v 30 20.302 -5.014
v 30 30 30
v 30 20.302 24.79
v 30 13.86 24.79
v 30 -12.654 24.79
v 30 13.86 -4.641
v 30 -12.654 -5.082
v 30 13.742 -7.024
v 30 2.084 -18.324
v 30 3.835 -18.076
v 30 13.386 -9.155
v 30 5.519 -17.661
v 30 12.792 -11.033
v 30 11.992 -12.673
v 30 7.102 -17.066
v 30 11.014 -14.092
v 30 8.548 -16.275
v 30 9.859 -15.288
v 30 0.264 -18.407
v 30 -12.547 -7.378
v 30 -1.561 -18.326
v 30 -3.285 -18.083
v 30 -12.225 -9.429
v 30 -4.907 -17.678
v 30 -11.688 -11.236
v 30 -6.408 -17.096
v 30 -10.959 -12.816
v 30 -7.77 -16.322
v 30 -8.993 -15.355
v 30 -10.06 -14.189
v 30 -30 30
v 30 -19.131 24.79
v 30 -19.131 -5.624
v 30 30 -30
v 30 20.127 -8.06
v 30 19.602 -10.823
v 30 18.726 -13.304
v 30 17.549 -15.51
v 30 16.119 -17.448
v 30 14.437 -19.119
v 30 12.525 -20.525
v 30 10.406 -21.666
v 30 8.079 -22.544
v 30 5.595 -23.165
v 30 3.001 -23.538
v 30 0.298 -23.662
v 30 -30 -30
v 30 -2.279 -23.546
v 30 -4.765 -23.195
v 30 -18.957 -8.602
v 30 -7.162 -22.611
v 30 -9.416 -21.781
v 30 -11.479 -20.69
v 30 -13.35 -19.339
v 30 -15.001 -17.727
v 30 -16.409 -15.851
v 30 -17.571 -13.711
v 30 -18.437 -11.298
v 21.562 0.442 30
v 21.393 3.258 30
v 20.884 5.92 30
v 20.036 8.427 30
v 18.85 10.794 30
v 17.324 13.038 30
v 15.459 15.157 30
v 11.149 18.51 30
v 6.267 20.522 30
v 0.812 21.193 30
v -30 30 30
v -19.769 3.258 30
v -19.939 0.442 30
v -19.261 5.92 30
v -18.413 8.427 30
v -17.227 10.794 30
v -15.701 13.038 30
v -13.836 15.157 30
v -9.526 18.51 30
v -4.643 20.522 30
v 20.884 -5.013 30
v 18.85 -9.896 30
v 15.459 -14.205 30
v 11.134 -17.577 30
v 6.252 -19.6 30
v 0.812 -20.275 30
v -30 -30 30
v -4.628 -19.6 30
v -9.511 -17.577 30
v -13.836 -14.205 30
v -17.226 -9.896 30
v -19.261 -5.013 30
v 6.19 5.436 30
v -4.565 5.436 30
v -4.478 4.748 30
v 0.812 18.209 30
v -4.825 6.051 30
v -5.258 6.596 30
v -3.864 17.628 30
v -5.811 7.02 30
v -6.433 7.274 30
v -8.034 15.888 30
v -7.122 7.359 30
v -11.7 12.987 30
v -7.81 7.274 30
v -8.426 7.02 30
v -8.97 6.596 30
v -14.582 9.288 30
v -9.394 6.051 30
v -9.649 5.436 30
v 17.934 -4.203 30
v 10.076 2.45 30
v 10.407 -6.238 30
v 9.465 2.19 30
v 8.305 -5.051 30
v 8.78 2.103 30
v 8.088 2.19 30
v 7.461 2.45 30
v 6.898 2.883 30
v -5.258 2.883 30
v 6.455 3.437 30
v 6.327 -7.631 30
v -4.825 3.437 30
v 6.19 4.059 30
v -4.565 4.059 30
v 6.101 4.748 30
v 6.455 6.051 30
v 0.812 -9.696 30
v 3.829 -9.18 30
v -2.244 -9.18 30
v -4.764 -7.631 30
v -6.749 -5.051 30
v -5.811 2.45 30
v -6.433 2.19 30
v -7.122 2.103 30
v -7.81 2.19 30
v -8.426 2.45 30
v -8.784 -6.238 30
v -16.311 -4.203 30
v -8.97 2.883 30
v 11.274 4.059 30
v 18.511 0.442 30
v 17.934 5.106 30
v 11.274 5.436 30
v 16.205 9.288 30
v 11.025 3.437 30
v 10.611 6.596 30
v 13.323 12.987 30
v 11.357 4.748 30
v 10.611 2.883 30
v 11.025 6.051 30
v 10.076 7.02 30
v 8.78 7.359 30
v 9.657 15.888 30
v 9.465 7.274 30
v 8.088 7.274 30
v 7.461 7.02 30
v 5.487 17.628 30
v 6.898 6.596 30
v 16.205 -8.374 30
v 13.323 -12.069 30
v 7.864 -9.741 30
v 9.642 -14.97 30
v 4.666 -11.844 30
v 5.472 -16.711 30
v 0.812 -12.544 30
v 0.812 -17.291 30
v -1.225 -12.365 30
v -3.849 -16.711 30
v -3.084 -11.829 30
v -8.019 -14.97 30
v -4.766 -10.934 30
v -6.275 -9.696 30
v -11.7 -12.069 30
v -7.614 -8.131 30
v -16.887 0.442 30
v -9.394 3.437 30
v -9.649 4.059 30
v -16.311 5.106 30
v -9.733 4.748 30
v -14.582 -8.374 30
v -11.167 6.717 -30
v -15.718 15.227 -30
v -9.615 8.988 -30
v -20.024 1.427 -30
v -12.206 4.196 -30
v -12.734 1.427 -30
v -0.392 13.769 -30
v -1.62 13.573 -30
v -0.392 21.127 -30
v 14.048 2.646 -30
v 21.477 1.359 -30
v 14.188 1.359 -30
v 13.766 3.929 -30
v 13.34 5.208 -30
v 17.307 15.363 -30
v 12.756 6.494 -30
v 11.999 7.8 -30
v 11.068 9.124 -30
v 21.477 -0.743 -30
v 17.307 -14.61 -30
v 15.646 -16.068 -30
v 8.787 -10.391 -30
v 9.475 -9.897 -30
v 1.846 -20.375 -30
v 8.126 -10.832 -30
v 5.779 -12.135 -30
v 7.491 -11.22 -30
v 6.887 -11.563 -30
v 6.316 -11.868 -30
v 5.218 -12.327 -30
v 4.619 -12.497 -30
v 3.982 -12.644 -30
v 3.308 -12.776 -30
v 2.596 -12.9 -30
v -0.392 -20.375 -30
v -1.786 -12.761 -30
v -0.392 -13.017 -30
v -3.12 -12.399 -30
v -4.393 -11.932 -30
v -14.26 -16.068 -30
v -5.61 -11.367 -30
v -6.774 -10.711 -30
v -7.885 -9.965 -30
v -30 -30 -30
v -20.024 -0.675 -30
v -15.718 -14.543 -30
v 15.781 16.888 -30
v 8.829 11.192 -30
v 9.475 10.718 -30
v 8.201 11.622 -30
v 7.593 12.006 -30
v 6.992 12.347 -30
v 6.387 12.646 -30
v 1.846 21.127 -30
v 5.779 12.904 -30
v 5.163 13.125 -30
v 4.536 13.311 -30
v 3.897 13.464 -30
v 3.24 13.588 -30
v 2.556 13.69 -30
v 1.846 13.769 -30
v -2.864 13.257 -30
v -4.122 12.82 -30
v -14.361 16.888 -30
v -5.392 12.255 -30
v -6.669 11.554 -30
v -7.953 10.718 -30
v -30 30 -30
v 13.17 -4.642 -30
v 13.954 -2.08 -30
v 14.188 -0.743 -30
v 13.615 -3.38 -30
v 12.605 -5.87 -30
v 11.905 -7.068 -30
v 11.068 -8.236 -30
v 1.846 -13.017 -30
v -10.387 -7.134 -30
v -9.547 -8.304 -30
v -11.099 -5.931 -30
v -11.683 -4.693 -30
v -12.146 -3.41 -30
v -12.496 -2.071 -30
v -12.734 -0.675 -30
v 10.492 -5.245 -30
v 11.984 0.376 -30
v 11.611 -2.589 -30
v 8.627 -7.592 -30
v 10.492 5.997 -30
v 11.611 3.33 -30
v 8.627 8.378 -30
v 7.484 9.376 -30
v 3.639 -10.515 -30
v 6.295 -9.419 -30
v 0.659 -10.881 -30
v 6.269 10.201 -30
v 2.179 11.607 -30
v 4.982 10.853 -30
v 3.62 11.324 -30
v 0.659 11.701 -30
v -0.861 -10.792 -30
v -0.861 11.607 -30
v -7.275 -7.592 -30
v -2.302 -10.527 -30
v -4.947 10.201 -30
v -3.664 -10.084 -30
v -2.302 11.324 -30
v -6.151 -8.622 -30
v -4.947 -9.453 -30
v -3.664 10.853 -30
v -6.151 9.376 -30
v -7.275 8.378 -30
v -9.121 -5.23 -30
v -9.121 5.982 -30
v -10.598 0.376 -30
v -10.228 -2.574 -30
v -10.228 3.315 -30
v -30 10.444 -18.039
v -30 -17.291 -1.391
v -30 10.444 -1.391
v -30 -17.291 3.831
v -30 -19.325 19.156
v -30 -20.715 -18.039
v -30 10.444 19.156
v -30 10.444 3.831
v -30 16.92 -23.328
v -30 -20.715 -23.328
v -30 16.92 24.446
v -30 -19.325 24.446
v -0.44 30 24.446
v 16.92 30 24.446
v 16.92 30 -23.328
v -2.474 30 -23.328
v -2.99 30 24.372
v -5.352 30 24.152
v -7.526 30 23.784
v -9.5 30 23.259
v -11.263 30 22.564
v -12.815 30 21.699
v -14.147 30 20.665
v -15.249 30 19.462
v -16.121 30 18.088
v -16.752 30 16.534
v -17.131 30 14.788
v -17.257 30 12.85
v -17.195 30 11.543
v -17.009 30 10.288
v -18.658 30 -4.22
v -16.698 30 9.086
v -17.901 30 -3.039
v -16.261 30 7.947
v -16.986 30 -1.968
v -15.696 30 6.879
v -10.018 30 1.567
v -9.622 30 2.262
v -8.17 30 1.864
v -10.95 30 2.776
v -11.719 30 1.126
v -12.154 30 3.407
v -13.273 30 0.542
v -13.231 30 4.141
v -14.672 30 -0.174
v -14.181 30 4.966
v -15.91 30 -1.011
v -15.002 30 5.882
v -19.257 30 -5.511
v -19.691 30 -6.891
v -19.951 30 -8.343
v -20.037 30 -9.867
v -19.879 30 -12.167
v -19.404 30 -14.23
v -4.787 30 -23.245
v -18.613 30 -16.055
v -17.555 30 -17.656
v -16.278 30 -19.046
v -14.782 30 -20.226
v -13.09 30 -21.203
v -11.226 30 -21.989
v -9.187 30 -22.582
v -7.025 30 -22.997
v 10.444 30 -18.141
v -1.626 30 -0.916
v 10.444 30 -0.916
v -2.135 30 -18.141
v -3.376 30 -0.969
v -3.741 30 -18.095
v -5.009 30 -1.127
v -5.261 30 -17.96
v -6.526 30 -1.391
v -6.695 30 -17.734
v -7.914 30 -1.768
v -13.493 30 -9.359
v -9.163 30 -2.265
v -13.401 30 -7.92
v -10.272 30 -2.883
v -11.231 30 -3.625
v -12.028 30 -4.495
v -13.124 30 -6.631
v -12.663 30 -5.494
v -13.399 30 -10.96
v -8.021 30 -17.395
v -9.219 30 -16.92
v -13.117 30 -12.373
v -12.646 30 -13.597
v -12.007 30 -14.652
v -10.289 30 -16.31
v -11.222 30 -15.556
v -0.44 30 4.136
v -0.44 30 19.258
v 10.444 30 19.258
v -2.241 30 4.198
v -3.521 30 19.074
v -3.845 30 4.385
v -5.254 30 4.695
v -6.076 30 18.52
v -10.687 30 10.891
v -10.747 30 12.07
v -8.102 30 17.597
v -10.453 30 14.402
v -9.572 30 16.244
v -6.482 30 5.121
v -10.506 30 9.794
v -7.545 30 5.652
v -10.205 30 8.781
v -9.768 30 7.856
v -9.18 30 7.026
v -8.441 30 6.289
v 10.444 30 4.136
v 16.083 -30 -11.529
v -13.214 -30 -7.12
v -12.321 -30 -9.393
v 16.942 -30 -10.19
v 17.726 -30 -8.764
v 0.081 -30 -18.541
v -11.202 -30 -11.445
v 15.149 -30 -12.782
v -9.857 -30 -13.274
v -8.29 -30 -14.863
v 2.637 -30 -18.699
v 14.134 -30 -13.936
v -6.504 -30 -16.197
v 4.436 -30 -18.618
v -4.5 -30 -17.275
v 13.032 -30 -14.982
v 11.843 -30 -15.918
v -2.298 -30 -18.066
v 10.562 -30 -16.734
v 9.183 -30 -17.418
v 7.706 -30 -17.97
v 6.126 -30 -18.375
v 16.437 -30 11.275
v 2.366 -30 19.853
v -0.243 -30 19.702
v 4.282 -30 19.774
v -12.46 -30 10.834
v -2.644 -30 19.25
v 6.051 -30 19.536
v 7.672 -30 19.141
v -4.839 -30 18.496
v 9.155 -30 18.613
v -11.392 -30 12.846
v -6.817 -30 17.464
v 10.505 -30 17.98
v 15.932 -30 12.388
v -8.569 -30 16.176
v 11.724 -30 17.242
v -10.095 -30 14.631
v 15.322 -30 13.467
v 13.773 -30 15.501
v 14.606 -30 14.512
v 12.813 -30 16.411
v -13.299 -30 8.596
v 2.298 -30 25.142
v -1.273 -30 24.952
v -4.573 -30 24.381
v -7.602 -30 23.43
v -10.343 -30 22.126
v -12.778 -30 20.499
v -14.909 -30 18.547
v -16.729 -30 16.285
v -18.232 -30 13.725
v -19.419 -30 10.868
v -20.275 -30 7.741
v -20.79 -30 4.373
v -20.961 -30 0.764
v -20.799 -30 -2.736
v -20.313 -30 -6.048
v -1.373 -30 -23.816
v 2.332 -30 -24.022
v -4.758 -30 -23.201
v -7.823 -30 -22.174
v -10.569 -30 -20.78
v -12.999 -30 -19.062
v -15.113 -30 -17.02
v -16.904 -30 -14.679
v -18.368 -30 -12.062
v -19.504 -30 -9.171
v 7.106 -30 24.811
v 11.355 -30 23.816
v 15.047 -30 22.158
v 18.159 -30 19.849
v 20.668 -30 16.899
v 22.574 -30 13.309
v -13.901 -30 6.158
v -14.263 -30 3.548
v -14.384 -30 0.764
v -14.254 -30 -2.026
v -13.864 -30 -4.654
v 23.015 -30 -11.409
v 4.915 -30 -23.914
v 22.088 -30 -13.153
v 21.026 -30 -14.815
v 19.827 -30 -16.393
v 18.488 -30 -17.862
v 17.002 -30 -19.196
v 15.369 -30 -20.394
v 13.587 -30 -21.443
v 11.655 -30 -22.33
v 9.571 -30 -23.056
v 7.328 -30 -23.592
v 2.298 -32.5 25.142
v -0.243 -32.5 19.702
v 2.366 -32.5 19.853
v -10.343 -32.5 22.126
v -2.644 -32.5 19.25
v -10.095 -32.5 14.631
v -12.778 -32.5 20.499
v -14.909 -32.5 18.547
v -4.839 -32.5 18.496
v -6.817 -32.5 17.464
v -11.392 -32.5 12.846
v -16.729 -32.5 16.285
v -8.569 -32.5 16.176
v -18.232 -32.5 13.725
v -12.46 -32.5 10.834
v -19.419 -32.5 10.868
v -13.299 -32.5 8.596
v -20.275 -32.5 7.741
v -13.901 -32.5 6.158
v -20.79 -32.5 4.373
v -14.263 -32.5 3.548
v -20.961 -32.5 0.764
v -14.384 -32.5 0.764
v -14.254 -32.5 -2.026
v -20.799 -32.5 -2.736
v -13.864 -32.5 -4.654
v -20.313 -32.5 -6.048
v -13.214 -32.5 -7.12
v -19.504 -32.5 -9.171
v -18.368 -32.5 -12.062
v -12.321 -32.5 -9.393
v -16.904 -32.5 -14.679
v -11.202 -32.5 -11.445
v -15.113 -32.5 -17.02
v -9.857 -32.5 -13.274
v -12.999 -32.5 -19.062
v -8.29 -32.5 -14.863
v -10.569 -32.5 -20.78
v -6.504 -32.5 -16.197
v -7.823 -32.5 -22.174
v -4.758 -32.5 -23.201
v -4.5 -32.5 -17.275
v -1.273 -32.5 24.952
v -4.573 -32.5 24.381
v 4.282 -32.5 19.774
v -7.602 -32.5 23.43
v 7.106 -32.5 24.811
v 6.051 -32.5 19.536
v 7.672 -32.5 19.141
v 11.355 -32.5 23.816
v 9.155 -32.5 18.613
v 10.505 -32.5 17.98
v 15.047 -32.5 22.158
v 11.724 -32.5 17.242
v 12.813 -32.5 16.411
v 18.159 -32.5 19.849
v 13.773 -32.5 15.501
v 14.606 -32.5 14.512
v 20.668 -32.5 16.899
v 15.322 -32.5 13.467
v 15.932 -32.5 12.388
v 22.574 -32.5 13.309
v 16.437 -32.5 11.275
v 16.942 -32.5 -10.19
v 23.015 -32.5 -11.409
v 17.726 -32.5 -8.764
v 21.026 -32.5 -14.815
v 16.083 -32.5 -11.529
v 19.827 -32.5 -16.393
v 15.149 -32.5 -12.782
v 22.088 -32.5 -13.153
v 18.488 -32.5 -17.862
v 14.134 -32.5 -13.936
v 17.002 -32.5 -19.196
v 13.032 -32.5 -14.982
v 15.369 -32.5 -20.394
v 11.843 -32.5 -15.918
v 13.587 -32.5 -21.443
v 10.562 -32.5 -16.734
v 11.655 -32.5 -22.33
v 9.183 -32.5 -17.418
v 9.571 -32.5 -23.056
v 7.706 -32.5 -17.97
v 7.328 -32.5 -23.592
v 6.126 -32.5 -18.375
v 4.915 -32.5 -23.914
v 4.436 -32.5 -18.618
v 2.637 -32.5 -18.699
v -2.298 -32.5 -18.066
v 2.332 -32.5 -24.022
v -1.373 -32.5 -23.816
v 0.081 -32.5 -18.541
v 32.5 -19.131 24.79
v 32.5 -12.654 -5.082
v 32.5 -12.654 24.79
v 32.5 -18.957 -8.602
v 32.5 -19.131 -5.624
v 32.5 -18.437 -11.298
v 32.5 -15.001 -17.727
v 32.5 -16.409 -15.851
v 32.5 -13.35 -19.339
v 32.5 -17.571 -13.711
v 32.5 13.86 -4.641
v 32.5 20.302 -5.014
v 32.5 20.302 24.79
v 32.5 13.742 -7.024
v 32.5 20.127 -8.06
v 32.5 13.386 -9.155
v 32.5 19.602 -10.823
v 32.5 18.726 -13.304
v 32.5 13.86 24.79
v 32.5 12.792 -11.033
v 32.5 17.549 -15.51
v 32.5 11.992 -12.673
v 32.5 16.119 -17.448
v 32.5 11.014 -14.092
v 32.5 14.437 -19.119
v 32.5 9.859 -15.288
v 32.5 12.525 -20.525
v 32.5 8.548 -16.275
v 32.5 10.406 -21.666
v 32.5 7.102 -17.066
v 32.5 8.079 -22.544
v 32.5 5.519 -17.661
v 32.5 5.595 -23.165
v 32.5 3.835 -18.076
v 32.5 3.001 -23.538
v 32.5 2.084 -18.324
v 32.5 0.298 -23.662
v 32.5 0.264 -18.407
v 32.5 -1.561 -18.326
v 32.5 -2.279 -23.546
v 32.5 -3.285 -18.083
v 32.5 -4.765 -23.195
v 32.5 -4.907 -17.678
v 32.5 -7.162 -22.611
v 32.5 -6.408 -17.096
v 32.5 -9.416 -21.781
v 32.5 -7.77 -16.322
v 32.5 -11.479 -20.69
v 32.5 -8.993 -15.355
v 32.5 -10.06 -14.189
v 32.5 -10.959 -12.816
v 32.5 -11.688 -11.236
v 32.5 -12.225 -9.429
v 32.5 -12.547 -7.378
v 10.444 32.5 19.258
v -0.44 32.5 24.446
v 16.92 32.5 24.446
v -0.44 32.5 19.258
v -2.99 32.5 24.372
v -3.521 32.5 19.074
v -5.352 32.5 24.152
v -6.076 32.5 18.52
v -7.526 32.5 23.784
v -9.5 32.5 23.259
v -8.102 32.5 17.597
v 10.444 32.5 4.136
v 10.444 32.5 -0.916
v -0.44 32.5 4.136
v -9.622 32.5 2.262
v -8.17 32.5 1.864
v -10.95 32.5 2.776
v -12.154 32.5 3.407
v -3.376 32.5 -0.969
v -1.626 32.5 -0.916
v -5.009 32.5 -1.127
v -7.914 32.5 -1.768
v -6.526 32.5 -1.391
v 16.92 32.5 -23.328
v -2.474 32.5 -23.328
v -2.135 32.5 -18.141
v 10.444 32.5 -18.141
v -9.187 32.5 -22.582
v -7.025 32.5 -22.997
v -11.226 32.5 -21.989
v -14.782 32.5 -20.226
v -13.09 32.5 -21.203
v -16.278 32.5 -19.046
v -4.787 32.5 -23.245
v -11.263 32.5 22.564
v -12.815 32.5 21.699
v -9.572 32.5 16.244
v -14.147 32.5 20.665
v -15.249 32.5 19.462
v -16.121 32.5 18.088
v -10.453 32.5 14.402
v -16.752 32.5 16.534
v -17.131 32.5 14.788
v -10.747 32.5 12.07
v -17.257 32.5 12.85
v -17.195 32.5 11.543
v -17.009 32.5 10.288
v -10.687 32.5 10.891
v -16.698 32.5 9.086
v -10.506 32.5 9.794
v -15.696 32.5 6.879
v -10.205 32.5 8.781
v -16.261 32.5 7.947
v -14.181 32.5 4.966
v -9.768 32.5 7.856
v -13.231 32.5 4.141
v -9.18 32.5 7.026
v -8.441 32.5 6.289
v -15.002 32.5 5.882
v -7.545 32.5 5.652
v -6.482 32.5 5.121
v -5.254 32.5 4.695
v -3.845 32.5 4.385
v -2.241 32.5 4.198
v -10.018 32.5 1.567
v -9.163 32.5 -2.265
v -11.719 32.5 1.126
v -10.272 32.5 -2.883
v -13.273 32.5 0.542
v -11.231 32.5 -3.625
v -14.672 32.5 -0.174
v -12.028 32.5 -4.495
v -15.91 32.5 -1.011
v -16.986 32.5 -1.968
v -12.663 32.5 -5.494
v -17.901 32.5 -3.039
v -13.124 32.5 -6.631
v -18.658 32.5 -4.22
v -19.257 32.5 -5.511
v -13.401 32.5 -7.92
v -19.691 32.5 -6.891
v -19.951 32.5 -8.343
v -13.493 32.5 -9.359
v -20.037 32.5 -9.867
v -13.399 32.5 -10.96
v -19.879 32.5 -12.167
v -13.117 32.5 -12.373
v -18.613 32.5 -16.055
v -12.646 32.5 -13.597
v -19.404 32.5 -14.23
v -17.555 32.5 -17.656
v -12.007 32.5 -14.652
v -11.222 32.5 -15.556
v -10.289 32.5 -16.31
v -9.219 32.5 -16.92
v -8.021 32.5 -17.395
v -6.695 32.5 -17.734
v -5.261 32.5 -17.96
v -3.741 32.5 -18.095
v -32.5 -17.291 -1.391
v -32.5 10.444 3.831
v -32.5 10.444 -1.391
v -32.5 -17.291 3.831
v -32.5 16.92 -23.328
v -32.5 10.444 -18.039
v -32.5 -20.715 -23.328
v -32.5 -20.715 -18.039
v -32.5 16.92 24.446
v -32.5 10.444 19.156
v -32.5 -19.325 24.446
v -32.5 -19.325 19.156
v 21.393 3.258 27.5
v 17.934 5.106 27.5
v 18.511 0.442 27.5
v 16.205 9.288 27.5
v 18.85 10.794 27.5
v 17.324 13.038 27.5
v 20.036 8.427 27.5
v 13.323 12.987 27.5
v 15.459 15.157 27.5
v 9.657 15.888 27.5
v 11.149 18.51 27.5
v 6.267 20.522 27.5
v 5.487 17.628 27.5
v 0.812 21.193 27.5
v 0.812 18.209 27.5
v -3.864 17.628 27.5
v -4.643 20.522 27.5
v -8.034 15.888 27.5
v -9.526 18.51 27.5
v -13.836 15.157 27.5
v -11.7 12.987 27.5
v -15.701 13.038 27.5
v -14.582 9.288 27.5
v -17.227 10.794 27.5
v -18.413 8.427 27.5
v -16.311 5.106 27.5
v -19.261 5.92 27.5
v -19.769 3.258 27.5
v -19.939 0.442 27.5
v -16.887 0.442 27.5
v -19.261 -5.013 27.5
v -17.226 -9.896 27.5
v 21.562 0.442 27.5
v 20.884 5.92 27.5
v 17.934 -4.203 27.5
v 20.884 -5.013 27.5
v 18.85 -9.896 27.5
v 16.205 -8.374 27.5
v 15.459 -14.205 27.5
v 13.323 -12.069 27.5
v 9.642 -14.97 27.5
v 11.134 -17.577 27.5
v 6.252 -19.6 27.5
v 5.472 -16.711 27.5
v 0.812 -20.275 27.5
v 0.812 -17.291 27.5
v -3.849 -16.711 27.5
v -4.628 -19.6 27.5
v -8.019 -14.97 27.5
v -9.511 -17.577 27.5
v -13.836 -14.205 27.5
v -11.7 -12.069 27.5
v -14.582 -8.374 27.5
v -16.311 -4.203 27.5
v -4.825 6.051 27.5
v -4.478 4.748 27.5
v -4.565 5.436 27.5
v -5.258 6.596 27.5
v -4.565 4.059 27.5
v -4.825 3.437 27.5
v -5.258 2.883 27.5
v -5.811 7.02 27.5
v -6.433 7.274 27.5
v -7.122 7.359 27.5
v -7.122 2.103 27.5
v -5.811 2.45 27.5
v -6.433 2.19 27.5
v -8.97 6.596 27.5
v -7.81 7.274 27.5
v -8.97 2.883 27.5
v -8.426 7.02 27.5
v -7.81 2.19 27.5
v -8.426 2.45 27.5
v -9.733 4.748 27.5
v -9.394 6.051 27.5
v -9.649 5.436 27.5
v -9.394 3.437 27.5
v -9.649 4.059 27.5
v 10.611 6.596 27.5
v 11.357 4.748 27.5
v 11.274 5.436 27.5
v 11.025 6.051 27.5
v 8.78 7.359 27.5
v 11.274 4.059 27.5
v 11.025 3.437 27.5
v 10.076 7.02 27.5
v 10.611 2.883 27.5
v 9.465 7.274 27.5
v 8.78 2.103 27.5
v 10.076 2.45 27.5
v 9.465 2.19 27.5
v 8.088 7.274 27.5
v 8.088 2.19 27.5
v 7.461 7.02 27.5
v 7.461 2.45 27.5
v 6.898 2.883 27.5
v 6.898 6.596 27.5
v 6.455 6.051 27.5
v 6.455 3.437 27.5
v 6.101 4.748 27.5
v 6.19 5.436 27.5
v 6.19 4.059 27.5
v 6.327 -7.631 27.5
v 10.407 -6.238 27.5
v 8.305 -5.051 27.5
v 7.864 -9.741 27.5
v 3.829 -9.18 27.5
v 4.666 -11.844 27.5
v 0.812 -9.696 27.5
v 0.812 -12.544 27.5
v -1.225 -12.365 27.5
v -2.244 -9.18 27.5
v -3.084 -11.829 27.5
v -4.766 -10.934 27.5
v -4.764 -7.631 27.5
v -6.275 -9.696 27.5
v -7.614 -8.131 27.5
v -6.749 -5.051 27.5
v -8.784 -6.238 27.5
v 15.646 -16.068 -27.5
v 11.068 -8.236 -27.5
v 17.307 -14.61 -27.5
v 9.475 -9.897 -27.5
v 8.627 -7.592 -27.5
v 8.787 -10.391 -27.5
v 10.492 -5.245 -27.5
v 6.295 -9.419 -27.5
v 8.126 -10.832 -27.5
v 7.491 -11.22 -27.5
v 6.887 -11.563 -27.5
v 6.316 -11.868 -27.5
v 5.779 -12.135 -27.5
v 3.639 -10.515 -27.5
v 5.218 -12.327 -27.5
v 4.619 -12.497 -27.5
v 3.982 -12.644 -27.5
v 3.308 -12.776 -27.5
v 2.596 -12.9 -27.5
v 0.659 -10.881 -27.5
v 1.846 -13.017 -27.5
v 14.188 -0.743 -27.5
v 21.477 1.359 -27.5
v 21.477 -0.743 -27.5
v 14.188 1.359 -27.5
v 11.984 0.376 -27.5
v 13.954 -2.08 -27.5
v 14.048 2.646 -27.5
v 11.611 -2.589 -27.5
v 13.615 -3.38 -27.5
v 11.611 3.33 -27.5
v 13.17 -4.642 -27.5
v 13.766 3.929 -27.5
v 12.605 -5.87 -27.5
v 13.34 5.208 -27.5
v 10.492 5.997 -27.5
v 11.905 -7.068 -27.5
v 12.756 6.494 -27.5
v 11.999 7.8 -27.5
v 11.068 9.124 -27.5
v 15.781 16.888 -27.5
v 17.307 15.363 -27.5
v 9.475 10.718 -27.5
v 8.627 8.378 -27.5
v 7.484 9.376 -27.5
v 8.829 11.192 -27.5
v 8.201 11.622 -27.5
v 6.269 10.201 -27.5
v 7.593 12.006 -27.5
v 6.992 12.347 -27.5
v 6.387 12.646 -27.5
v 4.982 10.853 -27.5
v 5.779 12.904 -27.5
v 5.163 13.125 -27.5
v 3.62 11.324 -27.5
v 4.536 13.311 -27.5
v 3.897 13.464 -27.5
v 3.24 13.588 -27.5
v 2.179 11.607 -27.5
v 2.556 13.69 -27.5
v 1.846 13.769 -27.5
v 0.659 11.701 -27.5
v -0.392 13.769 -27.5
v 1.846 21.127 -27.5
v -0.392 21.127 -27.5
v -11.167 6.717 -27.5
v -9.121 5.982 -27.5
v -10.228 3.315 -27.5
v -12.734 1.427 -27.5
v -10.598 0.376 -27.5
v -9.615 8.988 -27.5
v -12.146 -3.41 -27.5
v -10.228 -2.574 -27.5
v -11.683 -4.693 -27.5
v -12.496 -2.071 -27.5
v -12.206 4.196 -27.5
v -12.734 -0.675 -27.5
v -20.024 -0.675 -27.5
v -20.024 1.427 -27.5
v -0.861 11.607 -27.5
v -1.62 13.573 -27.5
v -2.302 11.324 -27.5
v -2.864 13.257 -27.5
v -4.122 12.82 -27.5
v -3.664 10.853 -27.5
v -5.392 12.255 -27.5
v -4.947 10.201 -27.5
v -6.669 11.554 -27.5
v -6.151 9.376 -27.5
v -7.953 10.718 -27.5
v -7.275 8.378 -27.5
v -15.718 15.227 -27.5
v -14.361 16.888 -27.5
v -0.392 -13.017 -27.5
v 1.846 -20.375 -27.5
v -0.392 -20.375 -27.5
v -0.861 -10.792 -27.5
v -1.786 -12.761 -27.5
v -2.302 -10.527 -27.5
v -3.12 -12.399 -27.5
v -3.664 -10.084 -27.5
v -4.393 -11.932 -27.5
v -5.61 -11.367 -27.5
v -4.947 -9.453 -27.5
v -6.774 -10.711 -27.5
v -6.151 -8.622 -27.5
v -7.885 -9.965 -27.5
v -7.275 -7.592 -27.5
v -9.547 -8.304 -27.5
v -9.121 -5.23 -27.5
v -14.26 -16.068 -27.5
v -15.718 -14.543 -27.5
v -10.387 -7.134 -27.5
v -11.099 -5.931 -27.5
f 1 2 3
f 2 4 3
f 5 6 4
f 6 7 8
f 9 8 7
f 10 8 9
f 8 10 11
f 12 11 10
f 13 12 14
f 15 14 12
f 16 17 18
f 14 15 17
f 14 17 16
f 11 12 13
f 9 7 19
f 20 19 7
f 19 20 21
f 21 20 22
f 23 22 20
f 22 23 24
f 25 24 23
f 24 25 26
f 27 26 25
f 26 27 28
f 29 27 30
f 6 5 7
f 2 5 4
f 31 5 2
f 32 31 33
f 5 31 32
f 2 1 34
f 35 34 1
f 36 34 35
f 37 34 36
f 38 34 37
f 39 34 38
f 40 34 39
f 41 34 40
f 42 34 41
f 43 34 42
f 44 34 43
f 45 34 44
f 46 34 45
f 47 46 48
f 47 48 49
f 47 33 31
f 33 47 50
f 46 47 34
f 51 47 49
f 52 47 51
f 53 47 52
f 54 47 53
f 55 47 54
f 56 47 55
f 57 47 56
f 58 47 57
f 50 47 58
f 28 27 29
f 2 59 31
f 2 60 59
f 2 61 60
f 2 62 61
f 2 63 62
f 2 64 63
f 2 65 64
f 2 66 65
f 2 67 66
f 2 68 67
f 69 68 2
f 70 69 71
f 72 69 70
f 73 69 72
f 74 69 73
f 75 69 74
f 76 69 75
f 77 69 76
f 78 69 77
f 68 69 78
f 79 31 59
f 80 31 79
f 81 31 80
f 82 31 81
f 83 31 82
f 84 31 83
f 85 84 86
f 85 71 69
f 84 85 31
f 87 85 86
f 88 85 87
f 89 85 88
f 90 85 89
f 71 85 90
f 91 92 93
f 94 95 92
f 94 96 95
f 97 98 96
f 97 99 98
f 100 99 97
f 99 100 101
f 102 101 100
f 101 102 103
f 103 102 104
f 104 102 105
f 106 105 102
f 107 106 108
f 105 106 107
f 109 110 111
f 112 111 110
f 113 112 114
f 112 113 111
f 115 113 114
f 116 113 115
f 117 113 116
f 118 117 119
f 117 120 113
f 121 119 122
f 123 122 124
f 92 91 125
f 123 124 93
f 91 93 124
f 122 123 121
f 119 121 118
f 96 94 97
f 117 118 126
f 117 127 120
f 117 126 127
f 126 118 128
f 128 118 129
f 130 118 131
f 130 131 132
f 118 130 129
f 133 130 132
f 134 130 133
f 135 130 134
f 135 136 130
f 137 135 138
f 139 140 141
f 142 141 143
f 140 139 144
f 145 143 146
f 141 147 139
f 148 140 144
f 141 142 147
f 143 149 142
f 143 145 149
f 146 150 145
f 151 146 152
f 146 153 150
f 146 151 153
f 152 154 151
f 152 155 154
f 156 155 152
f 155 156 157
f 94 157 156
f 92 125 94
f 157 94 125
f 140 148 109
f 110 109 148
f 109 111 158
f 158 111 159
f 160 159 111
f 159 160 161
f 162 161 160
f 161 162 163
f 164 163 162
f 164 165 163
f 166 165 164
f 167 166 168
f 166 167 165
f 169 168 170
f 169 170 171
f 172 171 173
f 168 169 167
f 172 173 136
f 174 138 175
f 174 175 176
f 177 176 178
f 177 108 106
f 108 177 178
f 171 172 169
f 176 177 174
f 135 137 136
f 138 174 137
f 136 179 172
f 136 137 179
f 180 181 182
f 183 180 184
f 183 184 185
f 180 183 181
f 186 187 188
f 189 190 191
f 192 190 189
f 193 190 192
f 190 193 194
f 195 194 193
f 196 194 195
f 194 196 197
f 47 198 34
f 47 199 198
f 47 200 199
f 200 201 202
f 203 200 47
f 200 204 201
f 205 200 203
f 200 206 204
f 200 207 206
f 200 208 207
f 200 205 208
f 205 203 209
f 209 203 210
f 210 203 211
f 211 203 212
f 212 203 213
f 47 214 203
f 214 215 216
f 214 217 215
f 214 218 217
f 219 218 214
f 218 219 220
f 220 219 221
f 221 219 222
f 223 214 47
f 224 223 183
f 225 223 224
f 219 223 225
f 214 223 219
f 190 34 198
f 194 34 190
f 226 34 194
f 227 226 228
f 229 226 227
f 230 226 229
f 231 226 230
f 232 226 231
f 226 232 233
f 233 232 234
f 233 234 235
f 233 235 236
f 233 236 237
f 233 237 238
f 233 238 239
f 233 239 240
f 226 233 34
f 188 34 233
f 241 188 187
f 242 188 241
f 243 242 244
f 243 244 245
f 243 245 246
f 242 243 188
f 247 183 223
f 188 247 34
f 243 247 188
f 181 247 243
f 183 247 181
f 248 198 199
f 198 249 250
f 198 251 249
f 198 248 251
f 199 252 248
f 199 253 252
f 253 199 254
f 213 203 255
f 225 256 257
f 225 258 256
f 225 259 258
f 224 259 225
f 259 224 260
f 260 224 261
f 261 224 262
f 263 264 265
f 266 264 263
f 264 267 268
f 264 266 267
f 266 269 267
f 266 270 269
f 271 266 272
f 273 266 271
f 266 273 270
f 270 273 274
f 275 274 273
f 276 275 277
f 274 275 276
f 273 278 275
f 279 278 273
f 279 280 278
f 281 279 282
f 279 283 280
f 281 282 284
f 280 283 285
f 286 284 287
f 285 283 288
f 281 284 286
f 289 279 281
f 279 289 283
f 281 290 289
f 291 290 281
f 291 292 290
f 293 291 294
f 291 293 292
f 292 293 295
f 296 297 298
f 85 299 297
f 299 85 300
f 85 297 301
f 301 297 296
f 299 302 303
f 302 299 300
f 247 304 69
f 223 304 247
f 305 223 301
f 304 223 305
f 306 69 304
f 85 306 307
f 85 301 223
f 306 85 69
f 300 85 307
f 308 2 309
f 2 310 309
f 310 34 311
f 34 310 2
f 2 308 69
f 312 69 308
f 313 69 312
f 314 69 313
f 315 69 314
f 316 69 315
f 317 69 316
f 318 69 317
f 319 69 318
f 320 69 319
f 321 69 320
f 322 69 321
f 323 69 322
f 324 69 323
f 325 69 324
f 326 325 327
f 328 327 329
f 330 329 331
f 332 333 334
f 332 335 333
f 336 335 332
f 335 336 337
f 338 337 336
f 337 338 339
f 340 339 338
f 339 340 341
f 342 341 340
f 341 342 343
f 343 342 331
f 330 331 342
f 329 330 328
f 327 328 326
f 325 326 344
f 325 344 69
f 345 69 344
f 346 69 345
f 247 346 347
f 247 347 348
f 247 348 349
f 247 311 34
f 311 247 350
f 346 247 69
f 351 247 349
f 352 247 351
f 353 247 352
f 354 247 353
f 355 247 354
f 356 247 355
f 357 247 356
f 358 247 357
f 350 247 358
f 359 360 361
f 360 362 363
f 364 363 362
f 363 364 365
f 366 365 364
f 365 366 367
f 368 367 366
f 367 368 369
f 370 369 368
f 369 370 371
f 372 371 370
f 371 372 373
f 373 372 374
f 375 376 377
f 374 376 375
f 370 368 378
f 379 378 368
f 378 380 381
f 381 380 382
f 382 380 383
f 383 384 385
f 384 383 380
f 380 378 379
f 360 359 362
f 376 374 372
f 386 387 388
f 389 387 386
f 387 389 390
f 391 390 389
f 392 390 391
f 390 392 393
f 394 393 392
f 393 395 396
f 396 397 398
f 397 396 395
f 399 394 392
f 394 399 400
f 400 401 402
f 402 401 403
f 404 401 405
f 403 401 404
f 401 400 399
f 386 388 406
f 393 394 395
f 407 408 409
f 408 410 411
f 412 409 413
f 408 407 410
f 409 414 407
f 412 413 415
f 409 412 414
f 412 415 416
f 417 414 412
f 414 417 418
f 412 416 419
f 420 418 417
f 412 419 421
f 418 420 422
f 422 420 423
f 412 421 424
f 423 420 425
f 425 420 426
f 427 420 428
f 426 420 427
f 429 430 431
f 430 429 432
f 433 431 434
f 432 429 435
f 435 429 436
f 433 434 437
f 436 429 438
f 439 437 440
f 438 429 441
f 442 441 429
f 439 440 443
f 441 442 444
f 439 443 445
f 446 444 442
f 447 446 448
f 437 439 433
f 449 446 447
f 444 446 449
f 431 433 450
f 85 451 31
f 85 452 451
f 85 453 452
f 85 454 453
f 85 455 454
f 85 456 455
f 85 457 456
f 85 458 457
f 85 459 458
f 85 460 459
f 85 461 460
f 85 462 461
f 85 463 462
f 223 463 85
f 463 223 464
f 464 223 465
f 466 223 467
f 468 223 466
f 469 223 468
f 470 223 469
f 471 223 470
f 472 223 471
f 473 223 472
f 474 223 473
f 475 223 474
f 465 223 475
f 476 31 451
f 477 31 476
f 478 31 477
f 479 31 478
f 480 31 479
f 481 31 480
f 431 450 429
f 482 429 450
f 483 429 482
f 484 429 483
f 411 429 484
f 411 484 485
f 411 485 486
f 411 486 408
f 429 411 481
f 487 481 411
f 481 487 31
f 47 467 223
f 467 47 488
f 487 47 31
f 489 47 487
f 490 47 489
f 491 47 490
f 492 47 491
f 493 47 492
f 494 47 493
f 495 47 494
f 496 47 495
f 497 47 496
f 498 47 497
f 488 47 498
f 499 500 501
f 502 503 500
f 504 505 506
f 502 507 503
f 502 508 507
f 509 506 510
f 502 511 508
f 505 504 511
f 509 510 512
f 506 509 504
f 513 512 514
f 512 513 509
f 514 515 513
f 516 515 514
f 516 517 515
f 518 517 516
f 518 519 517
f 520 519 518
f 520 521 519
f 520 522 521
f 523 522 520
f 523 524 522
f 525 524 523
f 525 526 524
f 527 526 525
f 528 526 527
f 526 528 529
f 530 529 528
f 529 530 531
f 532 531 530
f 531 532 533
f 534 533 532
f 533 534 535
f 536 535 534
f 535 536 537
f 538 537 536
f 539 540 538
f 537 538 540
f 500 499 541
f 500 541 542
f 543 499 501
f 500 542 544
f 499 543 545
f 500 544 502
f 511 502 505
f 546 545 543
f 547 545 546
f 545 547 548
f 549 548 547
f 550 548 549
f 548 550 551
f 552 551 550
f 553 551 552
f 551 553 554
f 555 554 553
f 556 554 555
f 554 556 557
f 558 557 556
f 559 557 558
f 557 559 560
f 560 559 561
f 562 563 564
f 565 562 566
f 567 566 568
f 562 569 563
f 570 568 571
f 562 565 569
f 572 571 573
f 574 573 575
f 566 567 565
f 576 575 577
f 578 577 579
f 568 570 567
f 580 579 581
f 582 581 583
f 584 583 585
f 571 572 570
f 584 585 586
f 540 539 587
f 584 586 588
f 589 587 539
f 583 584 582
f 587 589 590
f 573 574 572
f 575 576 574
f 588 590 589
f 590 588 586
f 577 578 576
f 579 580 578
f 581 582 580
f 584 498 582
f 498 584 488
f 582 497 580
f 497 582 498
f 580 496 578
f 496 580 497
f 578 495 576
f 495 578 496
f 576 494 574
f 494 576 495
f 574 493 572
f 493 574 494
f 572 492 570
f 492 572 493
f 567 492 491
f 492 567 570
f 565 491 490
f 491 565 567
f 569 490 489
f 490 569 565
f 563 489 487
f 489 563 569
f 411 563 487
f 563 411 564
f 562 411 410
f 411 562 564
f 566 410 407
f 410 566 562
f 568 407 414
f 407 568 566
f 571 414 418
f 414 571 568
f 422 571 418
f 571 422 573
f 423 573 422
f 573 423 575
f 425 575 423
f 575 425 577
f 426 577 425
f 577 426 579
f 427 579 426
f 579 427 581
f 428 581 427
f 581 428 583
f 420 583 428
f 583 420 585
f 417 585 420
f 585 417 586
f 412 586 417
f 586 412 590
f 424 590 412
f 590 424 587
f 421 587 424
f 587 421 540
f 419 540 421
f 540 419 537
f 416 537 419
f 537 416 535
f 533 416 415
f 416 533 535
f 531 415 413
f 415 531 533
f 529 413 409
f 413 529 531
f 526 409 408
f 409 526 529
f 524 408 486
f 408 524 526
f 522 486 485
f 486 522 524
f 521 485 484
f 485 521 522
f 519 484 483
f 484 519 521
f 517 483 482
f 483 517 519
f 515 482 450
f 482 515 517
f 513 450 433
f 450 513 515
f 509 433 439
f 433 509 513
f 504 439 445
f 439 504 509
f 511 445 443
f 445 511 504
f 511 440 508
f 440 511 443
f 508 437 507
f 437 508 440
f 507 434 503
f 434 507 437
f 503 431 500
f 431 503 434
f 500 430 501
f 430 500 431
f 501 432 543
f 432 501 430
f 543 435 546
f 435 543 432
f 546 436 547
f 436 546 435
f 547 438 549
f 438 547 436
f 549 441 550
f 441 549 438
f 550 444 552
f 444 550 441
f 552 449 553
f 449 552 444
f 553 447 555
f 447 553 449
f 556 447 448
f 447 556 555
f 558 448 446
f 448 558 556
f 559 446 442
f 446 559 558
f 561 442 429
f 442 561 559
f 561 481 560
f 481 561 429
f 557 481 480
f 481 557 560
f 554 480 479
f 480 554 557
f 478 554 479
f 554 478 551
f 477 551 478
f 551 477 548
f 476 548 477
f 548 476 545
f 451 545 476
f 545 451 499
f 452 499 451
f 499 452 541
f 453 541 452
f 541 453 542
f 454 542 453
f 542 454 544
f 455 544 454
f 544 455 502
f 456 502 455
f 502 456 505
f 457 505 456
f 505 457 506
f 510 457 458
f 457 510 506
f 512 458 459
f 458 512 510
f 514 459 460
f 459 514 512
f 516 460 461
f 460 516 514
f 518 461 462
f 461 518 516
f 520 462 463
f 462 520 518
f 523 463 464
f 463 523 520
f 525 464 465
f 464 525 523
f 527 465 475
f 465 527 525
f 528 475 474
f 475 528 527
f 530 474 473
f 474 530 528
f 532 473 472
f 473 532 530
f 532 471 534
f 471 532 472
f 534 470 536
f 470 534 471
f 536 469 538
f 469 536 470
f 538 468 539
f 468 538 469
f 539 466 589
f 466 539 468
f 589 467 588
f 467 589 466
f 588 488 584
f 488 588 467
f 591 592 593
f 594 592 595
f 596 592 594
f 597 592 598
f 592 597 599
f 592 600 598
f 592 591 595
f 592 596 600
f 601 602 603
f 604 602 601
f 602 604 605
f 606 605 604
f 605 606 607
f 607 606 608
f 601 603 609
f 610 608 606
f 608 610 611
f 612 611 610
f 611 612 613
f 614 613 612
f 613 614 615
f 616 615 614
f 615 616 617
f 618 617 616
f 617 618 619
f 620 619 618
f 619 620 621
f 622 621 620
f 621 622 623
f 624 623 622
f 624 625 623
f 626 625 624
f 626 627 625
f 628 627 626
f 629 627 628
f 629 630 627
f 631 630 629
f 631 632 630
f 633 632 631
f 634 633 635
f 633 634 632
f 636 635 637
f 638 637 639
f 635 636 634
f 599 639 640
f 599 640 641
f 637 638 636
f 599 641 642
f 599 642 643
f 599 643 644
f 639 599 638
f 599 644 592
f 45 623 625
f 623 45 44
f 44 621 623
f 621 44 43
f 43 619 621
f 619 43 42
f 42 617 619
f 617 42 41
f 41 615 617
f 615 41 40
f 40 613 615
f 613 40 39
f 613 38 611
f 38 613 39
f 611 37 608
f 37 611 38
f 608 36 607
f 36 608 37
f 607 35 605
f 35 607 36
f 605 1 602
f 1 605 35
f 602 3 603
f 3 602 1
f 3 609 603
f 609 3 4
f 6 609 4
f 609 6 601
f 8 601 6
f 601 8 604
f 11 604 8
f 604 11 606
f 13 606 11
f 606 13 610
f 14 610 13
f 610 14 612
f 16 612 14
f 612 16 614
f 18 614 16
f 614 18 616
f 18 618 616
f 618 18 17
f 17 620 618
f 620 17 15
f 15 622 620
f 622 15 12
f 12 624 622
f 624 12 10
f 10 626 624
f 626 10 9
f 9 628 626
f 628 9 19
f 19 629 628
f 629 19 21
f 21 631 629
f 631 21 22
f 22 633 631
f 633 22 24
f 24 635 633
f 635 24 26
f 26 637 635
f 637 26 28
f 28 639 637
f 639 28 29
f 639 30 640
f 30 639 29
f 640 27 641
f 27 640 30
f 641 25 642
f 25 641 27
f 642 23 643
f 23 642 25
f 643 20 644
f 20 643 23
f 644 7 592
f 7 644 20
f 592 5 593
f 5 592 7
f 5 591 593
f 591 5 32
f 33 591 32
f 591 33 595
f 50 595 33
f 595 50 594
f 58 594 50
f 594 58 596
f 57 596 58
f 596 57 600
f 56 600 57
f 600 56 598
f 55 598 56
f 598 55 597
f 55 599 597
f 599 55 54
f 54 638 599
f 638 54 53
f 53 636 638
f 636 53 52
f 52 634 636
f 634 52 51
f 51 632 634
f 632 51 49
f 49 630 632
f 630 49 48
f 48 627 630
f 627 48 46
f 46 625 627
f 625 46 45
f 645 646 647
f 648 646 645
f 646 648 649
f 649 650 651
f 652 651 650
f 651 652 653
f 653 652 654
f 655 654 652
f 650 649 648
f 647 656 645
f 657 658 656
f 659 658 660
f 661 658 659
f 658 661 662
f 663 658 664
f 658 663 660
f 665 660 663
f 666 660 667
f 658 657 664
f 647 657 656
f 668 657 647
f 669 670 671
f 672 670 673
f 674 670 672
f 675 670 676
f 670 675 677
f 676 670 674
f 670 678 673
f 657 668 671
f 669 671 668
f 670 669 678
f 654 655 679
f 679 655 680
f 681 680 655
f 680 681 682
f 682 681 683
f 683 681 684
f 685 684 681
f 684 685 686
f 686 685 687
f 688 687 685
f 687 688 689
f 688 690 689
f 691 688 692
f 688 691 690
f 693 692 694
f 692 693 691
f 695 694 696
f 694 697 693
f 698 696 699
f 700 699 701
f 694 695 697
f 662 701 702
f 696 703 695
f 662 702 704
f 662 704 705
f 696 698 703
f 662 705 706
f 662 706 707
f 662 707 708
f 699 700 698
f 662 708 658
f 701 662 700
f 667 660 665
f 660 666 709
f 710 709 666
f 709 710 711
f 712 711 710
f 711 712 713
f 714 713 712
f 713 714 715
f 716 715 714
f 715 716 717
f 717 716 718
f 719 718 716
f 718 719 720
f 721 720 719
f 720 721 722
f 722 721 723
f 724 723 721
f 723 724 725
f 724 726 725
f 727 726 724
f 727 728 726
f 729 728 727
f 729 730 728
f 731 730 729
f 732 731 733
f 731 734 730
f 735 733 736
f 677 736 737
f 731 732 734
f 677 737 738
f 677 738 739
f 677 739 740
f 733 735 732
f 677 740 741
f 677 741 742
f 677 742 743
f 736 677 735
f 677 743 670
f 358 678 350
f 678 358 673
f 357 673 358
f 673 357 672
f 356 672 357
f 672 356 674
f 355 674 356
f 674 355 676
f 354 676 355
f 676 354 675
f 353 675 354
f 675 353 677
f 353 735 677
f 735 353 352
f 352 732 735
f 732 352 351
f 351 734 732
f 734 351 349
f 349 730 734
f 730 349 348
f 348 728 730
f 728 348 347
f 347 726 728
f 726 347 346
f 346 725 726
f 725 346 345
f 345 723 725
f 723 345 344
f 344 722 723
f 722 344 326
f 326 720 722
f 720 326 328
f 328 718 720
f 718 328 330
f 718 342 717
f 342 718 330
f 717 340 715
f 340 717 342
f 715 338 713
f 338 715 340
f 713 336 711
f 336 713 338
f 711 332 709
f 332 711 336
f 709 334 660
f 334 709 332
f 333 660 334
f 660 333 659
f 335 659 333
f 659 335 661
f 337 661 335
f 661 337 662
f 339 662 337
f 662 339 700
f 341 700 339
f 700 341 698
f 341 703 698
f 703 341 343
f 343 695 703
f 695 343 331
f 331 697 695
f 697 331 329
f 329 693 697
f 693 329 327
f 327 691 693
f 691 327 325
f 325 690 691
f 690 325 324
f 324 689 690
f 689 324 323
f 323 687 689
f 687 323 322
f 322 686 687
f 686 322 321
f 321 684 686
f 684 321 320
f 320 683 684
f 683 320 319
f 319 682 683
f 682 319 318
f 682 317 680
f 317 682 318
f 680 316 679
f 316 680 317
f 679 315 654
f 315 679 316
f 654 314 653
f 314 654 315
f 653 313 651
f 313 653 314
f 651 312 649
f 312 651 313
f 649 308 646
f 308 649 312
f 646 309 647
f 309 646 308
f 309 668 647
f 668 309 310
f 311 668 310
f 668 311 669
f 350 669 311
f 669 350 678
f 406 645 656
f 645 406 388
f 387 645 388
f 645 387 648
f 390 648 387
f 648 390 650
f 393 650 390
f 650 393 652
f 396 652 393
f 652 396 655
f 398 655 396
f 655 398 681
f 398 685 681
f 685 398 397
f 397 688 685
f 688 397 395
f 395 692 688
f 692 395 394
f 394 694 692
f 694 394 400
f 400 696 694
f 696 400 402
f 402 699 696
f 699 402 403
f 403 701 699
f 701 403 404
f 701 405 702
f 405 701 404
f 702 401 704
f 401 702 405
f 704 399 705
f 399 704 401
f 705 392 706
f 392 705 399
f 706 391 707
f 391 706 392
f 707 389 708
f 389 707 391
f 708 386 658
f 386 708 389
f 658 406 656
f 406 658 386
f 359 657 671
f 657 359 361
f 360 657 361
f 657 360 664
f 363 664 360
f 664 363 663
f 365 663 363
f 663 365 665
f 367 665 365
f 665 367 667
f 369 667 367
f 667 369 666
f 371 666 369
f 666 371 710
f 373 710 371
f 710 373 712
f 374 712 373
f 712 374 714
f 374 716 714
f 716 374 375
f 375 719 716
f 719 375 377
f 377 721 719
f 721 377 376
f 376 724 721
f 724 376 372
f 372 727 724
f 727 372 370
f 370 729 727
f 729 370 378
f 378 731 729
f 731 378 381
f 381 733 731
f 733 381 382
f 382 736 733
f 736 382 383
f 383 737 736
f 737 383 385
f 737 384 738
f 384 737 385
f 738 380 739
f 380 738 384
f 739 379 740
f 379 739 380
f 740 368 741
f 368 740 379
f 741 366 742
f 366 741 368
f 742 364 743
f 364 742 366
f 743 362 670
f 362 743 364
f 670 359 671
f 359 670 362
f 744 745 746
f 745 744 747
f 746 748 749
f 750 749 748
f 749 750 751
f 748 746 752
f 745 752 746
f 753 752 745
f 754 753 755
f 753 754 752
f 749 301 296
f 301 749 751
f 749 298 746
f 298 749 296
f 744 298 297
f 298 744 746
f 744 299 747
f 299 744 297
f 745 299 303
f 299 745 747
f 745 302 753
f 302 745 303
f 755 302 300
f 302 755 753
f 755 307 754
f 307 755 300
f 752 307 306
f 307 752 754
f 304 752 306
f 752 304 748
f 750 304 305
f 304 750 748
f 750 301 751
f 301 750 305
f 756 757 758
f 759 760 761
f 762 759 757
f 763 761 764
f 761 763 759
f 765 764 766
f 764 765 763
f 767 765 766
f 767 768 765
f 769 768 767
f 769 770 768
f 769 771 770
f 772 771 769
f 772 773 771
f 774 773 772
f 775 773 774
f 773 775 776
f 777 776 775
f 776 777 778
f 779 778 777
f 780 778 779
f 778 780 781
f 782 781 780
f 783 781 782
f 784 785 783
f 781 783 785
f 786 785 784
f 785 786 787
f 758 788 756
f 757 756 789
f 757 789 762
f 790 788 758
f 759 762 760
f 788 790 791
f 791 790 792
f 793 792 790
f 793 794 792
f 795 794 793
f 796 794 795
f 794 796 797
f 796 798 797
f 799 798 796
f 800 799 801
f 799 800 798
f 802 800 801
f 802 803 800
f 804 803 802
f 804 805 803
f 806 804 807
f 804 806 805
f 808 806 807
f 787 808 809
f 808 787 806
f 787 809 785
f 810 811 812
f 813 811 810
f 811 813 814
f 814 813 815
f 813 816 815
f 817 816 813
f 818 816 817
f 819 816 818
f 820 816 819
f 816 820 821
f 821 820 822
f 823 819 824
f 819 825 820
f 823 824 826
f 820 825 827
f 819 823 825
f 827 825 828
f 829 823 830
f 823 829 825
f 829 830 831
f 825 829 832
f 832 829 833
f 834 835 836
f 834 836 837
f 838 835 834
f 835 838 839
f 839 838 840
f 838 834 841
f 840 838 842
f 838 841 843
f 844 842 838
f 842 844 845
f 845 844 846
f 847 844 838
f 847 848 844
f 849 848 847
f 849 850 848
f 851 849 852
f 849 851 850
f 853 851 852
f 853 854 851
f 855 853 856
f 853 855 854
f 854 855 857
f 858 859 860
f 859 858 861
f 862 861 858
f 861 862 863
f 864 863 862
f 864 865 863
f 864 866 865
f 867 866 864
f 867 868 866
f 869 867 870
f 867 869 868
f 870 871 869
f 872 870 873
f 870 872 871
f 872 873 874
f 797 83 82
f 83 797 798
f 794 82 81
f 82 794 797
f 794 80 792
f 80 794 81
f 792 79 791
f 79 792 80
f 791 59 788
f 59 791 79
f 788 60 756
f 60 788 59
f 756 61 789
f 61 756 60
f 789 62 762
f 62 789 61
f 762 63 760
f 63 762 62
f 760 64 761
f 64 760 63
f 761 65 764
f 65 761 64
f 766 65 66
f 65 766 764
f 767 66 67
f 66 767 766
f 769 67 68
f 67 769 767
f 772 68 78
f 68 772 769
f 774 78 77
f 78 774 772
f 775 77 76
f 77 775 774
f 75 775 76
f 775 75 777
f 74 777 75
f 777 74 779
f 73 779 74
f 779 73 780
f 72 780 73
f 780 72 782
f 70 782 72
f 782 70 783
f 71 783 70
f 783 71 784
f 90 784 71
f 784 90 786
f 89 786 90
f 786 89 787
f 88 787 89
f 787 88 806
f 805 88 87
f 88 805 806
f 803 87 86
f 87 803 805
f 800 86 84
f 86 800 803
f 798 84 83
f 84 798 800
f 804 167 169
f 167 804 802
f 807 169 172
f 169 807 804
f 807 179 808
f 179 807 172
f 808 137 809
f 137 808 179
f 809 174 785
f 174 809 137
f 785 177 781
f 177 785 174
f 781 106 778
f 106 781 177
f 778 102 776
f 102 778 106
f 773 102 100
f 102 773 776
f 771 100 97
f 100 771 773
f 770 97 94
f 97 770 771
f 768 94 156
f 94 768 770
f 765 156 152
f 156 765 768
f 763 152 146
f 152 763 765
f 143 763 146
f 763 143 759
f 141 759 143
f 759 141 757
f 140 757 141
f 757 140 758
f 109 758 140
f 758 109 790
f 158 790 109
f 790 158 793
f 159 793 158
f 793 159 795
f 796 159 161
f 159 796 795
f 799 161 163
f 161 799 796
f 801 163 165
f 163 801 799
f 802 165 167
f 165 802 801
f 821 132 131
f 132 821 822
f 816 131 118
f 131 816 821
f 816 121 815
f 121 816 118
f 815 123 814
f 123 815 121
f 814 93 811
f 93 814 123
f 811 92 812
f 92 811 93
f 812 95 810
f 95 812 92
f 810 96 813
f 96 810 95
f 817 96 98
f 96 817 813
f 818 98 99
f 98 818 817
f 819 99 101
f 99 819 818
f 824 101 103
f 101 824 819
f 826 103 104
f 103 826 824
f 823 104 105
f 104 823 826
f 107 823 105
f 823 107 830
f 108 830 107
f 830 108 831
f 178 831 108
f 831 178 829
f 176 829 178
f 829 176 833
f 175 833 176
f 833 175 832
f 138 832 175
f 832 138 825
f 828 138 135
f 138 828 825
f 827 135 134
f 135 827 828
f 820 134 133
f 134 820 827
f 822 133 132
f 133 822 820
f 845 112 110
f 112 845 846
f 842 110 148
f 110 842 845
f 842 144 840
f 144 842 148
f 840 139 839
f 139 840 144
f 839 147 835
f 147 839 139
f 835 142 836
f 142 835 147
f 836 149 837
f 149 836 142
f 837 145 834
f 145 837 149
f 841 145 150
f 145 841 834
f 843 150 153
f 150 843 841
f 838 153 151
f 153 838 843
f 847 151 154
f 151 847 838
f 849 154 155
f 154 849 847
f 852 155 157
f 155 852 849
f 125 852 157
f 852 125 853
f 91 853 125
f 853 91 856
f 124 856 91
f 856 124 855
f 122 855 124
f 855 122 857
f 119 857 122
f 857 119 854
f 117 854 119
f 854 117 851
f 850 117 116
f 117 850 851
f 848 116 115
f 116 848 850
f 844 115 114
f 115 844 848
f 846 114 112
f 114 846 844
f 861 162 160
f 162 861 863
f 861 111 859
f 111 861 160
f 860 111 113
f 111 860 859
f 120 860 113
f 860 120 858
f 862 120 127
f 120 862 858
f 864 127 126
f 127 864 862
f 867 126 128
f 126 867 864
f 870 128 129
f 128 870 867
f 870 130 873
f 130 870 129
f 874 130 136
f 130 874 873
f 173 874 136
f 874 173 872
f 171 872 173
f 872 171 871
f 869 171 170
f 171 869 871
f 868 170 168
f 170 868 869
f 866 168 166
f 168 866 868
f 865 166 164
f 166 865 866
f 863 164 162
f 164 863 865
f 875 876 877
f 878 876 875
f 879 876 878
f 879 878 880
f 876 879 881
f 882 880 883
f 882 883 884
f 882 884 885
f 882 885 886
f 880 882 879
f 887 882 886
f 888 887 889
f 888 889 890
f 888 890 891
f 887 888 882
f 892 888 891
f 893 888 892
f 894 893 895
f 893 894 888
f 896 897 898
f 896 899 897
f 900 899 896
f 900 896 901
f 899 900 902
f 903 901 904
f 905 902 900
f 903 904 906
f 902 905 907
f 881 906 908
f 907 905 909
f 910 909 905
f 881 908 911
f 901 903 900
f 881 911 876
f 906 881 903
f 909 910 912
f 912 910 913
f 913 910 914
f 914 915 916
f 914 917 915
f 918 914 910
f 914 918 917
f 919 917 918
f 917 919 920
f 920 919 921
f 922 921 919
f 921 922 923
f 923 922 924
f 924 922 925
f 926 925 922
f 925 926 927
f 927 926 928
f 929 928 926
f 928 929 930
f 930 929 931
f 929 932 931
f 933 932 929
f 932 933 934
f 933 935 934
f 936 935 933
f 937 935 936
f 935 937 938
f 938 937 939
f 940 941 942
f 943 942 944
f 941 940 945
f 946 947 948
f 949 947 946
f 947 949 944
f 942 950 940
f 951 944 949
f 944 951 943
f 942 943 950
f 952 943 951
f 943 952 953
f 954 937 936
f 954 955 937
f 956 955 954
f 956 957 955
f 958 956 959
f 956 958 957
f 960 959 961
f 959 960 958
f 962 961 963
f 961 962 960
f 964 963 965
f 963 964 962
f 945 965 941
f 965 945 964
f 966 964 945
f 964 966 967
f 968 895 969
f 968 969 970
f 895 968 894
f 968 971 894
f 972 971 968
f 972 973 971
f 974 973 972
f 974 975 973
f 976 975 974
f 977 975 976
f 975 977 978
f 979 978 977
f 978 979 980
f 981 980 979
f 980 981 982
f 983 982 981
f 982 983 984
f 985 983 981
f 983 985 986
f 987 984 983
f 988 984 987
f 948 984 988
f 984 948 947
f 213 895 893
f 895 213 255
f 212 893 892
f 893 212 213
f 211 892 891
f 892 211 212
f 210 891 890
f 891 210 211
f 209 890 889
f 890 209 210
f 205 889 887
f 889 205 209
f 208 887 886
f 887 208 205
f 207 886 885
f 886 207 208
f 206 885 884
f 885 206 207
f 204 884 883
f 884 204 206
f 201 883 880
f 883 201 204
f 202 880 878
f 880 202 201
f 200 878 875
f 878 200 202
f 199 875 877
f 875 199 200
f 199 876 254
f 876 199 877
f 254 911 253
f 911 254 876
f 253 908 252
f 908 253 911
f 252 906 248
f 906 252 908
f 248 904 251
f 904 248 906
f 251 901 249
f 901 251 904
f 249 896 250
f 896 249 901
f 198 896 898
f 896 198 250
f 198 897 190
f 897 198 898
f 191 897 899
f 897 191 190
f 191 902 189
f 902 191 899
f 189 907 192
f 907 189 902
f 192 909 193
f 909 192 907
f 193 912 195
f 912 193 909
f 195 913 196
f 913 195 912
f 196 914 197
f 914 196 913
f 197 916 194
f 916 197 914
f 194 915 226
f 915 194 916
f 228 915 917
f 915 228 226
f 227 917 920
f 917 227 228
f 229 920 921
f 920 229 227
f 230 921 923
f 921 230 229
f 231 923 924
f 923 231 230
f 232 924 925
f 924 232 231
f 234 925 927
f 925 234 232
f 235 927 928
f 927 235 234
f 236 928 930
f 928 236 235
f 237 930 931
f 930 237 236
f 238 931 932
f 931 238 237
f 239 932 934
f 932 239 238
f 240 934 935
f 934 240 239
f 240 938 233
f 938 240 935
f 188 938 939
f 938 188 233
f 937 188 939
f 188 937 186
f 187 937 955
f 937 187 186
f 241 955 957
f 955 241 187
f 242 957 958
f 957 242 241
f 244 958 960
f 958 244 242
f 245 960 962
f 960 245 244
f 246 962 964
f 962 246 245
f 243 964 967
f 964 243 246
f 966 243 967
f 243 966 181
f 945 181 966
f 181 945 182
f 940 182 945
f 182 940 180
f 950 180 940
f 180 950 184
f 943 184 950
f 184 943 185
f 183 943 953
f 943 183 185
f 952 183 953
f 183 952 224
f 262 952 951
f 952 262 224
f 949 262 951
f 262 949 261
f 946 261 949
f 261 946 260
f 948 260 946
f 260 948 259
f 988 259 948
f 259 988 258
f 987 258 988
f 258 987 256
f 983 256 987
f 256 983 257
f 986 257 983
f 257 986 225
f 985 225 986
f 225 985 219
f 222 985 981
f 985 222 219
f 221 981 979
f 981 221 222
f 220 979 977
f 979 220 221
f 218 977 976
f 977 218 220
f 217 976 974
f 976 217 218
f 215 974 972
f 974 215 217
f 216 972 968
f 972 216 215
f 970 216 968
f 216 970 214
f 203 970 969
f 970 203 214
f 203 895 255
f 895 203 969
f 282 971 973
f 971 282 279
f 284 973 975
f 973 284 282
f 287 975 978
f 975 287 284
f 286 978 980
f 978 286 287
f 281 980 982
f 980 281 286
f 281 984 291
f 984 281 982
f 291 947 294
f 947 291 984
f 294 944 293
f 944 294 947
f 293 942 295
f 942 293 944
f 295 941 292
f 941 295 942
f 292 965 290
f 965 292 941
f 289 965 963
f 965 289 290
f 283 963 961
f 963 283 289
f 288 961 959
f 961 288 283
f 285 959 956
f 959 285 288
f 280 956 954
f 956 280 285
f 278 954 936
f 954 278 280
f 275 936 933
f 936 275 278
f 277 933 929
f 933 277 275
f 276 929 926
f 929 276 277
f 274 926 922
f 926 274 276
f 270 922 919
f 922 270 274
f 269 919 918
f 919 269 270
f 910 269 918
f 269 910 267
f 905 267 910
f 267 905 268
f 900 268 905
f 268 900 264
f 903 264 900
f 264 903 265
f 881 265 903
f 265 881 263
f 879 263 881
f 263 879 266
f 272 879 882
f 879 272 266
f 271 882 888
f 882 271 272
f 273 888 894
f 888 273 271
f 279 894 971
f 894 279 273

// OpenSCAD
// text_on_cube.scad - Example for text() usage in OpenSCAD

echo(version=version());

font = "Liberation Sans";

cube_size = 60;
letter_size = 50;
letter_height = 5;

o = cube_size / 2 - letter_height / 2;

module letter(l) {
	// Use linear_extrude() to make the letters 3D objects as they
	// are only 2D shapes when only using text()
	linear_extrude(height = letter_height) {
		text(l, size = letter_size, font = font, halign = "center", valign = "center", $fn = 16);
	}
}

difference() {
	union() {
		color("gray") cube(cube_size, center = true);
		translate([0, -o, 0]) rotate([90, 0, 0]) letter("C");
		translate([o, 0, 0]) rotate([90, 0, 90]) letter("U");
		translate([0, o, 0]) rotate([90, 0, 180]) letter("B");
		translate([-o, 0, 0]) rotate([90, 0, -90]) letter("E");
	}

	// Put some symbols on top and bottom using symbols from the
	// Unicode symbols table.
	// (see https://en.wikipedia.org/wiki/Miscellaneous_Symbols)
	//
	// Note that depending on the font used, not all the symbols
	// are actually available.
	translate([0, 0, o])  letter("\u263A");
	translate([0, 0, -o - letter_height])  letter("\u263C");
}



// Written in 2014 by Torsten Paul &ltTorsten.Paul@gmx.de>
//
// To the extent possible under law, the author(s) have dedicated all
// copyright and related and neighboring rights to this software to the
// public domain worldwide. This software is distributed without any
// warranty.
//
// You should have received a copy of the CC0 Public Domain
// Dedication along with this software.
// If not, see &lthttp://creativecommons.org/publicdomain/zero/1.0/&gt.
